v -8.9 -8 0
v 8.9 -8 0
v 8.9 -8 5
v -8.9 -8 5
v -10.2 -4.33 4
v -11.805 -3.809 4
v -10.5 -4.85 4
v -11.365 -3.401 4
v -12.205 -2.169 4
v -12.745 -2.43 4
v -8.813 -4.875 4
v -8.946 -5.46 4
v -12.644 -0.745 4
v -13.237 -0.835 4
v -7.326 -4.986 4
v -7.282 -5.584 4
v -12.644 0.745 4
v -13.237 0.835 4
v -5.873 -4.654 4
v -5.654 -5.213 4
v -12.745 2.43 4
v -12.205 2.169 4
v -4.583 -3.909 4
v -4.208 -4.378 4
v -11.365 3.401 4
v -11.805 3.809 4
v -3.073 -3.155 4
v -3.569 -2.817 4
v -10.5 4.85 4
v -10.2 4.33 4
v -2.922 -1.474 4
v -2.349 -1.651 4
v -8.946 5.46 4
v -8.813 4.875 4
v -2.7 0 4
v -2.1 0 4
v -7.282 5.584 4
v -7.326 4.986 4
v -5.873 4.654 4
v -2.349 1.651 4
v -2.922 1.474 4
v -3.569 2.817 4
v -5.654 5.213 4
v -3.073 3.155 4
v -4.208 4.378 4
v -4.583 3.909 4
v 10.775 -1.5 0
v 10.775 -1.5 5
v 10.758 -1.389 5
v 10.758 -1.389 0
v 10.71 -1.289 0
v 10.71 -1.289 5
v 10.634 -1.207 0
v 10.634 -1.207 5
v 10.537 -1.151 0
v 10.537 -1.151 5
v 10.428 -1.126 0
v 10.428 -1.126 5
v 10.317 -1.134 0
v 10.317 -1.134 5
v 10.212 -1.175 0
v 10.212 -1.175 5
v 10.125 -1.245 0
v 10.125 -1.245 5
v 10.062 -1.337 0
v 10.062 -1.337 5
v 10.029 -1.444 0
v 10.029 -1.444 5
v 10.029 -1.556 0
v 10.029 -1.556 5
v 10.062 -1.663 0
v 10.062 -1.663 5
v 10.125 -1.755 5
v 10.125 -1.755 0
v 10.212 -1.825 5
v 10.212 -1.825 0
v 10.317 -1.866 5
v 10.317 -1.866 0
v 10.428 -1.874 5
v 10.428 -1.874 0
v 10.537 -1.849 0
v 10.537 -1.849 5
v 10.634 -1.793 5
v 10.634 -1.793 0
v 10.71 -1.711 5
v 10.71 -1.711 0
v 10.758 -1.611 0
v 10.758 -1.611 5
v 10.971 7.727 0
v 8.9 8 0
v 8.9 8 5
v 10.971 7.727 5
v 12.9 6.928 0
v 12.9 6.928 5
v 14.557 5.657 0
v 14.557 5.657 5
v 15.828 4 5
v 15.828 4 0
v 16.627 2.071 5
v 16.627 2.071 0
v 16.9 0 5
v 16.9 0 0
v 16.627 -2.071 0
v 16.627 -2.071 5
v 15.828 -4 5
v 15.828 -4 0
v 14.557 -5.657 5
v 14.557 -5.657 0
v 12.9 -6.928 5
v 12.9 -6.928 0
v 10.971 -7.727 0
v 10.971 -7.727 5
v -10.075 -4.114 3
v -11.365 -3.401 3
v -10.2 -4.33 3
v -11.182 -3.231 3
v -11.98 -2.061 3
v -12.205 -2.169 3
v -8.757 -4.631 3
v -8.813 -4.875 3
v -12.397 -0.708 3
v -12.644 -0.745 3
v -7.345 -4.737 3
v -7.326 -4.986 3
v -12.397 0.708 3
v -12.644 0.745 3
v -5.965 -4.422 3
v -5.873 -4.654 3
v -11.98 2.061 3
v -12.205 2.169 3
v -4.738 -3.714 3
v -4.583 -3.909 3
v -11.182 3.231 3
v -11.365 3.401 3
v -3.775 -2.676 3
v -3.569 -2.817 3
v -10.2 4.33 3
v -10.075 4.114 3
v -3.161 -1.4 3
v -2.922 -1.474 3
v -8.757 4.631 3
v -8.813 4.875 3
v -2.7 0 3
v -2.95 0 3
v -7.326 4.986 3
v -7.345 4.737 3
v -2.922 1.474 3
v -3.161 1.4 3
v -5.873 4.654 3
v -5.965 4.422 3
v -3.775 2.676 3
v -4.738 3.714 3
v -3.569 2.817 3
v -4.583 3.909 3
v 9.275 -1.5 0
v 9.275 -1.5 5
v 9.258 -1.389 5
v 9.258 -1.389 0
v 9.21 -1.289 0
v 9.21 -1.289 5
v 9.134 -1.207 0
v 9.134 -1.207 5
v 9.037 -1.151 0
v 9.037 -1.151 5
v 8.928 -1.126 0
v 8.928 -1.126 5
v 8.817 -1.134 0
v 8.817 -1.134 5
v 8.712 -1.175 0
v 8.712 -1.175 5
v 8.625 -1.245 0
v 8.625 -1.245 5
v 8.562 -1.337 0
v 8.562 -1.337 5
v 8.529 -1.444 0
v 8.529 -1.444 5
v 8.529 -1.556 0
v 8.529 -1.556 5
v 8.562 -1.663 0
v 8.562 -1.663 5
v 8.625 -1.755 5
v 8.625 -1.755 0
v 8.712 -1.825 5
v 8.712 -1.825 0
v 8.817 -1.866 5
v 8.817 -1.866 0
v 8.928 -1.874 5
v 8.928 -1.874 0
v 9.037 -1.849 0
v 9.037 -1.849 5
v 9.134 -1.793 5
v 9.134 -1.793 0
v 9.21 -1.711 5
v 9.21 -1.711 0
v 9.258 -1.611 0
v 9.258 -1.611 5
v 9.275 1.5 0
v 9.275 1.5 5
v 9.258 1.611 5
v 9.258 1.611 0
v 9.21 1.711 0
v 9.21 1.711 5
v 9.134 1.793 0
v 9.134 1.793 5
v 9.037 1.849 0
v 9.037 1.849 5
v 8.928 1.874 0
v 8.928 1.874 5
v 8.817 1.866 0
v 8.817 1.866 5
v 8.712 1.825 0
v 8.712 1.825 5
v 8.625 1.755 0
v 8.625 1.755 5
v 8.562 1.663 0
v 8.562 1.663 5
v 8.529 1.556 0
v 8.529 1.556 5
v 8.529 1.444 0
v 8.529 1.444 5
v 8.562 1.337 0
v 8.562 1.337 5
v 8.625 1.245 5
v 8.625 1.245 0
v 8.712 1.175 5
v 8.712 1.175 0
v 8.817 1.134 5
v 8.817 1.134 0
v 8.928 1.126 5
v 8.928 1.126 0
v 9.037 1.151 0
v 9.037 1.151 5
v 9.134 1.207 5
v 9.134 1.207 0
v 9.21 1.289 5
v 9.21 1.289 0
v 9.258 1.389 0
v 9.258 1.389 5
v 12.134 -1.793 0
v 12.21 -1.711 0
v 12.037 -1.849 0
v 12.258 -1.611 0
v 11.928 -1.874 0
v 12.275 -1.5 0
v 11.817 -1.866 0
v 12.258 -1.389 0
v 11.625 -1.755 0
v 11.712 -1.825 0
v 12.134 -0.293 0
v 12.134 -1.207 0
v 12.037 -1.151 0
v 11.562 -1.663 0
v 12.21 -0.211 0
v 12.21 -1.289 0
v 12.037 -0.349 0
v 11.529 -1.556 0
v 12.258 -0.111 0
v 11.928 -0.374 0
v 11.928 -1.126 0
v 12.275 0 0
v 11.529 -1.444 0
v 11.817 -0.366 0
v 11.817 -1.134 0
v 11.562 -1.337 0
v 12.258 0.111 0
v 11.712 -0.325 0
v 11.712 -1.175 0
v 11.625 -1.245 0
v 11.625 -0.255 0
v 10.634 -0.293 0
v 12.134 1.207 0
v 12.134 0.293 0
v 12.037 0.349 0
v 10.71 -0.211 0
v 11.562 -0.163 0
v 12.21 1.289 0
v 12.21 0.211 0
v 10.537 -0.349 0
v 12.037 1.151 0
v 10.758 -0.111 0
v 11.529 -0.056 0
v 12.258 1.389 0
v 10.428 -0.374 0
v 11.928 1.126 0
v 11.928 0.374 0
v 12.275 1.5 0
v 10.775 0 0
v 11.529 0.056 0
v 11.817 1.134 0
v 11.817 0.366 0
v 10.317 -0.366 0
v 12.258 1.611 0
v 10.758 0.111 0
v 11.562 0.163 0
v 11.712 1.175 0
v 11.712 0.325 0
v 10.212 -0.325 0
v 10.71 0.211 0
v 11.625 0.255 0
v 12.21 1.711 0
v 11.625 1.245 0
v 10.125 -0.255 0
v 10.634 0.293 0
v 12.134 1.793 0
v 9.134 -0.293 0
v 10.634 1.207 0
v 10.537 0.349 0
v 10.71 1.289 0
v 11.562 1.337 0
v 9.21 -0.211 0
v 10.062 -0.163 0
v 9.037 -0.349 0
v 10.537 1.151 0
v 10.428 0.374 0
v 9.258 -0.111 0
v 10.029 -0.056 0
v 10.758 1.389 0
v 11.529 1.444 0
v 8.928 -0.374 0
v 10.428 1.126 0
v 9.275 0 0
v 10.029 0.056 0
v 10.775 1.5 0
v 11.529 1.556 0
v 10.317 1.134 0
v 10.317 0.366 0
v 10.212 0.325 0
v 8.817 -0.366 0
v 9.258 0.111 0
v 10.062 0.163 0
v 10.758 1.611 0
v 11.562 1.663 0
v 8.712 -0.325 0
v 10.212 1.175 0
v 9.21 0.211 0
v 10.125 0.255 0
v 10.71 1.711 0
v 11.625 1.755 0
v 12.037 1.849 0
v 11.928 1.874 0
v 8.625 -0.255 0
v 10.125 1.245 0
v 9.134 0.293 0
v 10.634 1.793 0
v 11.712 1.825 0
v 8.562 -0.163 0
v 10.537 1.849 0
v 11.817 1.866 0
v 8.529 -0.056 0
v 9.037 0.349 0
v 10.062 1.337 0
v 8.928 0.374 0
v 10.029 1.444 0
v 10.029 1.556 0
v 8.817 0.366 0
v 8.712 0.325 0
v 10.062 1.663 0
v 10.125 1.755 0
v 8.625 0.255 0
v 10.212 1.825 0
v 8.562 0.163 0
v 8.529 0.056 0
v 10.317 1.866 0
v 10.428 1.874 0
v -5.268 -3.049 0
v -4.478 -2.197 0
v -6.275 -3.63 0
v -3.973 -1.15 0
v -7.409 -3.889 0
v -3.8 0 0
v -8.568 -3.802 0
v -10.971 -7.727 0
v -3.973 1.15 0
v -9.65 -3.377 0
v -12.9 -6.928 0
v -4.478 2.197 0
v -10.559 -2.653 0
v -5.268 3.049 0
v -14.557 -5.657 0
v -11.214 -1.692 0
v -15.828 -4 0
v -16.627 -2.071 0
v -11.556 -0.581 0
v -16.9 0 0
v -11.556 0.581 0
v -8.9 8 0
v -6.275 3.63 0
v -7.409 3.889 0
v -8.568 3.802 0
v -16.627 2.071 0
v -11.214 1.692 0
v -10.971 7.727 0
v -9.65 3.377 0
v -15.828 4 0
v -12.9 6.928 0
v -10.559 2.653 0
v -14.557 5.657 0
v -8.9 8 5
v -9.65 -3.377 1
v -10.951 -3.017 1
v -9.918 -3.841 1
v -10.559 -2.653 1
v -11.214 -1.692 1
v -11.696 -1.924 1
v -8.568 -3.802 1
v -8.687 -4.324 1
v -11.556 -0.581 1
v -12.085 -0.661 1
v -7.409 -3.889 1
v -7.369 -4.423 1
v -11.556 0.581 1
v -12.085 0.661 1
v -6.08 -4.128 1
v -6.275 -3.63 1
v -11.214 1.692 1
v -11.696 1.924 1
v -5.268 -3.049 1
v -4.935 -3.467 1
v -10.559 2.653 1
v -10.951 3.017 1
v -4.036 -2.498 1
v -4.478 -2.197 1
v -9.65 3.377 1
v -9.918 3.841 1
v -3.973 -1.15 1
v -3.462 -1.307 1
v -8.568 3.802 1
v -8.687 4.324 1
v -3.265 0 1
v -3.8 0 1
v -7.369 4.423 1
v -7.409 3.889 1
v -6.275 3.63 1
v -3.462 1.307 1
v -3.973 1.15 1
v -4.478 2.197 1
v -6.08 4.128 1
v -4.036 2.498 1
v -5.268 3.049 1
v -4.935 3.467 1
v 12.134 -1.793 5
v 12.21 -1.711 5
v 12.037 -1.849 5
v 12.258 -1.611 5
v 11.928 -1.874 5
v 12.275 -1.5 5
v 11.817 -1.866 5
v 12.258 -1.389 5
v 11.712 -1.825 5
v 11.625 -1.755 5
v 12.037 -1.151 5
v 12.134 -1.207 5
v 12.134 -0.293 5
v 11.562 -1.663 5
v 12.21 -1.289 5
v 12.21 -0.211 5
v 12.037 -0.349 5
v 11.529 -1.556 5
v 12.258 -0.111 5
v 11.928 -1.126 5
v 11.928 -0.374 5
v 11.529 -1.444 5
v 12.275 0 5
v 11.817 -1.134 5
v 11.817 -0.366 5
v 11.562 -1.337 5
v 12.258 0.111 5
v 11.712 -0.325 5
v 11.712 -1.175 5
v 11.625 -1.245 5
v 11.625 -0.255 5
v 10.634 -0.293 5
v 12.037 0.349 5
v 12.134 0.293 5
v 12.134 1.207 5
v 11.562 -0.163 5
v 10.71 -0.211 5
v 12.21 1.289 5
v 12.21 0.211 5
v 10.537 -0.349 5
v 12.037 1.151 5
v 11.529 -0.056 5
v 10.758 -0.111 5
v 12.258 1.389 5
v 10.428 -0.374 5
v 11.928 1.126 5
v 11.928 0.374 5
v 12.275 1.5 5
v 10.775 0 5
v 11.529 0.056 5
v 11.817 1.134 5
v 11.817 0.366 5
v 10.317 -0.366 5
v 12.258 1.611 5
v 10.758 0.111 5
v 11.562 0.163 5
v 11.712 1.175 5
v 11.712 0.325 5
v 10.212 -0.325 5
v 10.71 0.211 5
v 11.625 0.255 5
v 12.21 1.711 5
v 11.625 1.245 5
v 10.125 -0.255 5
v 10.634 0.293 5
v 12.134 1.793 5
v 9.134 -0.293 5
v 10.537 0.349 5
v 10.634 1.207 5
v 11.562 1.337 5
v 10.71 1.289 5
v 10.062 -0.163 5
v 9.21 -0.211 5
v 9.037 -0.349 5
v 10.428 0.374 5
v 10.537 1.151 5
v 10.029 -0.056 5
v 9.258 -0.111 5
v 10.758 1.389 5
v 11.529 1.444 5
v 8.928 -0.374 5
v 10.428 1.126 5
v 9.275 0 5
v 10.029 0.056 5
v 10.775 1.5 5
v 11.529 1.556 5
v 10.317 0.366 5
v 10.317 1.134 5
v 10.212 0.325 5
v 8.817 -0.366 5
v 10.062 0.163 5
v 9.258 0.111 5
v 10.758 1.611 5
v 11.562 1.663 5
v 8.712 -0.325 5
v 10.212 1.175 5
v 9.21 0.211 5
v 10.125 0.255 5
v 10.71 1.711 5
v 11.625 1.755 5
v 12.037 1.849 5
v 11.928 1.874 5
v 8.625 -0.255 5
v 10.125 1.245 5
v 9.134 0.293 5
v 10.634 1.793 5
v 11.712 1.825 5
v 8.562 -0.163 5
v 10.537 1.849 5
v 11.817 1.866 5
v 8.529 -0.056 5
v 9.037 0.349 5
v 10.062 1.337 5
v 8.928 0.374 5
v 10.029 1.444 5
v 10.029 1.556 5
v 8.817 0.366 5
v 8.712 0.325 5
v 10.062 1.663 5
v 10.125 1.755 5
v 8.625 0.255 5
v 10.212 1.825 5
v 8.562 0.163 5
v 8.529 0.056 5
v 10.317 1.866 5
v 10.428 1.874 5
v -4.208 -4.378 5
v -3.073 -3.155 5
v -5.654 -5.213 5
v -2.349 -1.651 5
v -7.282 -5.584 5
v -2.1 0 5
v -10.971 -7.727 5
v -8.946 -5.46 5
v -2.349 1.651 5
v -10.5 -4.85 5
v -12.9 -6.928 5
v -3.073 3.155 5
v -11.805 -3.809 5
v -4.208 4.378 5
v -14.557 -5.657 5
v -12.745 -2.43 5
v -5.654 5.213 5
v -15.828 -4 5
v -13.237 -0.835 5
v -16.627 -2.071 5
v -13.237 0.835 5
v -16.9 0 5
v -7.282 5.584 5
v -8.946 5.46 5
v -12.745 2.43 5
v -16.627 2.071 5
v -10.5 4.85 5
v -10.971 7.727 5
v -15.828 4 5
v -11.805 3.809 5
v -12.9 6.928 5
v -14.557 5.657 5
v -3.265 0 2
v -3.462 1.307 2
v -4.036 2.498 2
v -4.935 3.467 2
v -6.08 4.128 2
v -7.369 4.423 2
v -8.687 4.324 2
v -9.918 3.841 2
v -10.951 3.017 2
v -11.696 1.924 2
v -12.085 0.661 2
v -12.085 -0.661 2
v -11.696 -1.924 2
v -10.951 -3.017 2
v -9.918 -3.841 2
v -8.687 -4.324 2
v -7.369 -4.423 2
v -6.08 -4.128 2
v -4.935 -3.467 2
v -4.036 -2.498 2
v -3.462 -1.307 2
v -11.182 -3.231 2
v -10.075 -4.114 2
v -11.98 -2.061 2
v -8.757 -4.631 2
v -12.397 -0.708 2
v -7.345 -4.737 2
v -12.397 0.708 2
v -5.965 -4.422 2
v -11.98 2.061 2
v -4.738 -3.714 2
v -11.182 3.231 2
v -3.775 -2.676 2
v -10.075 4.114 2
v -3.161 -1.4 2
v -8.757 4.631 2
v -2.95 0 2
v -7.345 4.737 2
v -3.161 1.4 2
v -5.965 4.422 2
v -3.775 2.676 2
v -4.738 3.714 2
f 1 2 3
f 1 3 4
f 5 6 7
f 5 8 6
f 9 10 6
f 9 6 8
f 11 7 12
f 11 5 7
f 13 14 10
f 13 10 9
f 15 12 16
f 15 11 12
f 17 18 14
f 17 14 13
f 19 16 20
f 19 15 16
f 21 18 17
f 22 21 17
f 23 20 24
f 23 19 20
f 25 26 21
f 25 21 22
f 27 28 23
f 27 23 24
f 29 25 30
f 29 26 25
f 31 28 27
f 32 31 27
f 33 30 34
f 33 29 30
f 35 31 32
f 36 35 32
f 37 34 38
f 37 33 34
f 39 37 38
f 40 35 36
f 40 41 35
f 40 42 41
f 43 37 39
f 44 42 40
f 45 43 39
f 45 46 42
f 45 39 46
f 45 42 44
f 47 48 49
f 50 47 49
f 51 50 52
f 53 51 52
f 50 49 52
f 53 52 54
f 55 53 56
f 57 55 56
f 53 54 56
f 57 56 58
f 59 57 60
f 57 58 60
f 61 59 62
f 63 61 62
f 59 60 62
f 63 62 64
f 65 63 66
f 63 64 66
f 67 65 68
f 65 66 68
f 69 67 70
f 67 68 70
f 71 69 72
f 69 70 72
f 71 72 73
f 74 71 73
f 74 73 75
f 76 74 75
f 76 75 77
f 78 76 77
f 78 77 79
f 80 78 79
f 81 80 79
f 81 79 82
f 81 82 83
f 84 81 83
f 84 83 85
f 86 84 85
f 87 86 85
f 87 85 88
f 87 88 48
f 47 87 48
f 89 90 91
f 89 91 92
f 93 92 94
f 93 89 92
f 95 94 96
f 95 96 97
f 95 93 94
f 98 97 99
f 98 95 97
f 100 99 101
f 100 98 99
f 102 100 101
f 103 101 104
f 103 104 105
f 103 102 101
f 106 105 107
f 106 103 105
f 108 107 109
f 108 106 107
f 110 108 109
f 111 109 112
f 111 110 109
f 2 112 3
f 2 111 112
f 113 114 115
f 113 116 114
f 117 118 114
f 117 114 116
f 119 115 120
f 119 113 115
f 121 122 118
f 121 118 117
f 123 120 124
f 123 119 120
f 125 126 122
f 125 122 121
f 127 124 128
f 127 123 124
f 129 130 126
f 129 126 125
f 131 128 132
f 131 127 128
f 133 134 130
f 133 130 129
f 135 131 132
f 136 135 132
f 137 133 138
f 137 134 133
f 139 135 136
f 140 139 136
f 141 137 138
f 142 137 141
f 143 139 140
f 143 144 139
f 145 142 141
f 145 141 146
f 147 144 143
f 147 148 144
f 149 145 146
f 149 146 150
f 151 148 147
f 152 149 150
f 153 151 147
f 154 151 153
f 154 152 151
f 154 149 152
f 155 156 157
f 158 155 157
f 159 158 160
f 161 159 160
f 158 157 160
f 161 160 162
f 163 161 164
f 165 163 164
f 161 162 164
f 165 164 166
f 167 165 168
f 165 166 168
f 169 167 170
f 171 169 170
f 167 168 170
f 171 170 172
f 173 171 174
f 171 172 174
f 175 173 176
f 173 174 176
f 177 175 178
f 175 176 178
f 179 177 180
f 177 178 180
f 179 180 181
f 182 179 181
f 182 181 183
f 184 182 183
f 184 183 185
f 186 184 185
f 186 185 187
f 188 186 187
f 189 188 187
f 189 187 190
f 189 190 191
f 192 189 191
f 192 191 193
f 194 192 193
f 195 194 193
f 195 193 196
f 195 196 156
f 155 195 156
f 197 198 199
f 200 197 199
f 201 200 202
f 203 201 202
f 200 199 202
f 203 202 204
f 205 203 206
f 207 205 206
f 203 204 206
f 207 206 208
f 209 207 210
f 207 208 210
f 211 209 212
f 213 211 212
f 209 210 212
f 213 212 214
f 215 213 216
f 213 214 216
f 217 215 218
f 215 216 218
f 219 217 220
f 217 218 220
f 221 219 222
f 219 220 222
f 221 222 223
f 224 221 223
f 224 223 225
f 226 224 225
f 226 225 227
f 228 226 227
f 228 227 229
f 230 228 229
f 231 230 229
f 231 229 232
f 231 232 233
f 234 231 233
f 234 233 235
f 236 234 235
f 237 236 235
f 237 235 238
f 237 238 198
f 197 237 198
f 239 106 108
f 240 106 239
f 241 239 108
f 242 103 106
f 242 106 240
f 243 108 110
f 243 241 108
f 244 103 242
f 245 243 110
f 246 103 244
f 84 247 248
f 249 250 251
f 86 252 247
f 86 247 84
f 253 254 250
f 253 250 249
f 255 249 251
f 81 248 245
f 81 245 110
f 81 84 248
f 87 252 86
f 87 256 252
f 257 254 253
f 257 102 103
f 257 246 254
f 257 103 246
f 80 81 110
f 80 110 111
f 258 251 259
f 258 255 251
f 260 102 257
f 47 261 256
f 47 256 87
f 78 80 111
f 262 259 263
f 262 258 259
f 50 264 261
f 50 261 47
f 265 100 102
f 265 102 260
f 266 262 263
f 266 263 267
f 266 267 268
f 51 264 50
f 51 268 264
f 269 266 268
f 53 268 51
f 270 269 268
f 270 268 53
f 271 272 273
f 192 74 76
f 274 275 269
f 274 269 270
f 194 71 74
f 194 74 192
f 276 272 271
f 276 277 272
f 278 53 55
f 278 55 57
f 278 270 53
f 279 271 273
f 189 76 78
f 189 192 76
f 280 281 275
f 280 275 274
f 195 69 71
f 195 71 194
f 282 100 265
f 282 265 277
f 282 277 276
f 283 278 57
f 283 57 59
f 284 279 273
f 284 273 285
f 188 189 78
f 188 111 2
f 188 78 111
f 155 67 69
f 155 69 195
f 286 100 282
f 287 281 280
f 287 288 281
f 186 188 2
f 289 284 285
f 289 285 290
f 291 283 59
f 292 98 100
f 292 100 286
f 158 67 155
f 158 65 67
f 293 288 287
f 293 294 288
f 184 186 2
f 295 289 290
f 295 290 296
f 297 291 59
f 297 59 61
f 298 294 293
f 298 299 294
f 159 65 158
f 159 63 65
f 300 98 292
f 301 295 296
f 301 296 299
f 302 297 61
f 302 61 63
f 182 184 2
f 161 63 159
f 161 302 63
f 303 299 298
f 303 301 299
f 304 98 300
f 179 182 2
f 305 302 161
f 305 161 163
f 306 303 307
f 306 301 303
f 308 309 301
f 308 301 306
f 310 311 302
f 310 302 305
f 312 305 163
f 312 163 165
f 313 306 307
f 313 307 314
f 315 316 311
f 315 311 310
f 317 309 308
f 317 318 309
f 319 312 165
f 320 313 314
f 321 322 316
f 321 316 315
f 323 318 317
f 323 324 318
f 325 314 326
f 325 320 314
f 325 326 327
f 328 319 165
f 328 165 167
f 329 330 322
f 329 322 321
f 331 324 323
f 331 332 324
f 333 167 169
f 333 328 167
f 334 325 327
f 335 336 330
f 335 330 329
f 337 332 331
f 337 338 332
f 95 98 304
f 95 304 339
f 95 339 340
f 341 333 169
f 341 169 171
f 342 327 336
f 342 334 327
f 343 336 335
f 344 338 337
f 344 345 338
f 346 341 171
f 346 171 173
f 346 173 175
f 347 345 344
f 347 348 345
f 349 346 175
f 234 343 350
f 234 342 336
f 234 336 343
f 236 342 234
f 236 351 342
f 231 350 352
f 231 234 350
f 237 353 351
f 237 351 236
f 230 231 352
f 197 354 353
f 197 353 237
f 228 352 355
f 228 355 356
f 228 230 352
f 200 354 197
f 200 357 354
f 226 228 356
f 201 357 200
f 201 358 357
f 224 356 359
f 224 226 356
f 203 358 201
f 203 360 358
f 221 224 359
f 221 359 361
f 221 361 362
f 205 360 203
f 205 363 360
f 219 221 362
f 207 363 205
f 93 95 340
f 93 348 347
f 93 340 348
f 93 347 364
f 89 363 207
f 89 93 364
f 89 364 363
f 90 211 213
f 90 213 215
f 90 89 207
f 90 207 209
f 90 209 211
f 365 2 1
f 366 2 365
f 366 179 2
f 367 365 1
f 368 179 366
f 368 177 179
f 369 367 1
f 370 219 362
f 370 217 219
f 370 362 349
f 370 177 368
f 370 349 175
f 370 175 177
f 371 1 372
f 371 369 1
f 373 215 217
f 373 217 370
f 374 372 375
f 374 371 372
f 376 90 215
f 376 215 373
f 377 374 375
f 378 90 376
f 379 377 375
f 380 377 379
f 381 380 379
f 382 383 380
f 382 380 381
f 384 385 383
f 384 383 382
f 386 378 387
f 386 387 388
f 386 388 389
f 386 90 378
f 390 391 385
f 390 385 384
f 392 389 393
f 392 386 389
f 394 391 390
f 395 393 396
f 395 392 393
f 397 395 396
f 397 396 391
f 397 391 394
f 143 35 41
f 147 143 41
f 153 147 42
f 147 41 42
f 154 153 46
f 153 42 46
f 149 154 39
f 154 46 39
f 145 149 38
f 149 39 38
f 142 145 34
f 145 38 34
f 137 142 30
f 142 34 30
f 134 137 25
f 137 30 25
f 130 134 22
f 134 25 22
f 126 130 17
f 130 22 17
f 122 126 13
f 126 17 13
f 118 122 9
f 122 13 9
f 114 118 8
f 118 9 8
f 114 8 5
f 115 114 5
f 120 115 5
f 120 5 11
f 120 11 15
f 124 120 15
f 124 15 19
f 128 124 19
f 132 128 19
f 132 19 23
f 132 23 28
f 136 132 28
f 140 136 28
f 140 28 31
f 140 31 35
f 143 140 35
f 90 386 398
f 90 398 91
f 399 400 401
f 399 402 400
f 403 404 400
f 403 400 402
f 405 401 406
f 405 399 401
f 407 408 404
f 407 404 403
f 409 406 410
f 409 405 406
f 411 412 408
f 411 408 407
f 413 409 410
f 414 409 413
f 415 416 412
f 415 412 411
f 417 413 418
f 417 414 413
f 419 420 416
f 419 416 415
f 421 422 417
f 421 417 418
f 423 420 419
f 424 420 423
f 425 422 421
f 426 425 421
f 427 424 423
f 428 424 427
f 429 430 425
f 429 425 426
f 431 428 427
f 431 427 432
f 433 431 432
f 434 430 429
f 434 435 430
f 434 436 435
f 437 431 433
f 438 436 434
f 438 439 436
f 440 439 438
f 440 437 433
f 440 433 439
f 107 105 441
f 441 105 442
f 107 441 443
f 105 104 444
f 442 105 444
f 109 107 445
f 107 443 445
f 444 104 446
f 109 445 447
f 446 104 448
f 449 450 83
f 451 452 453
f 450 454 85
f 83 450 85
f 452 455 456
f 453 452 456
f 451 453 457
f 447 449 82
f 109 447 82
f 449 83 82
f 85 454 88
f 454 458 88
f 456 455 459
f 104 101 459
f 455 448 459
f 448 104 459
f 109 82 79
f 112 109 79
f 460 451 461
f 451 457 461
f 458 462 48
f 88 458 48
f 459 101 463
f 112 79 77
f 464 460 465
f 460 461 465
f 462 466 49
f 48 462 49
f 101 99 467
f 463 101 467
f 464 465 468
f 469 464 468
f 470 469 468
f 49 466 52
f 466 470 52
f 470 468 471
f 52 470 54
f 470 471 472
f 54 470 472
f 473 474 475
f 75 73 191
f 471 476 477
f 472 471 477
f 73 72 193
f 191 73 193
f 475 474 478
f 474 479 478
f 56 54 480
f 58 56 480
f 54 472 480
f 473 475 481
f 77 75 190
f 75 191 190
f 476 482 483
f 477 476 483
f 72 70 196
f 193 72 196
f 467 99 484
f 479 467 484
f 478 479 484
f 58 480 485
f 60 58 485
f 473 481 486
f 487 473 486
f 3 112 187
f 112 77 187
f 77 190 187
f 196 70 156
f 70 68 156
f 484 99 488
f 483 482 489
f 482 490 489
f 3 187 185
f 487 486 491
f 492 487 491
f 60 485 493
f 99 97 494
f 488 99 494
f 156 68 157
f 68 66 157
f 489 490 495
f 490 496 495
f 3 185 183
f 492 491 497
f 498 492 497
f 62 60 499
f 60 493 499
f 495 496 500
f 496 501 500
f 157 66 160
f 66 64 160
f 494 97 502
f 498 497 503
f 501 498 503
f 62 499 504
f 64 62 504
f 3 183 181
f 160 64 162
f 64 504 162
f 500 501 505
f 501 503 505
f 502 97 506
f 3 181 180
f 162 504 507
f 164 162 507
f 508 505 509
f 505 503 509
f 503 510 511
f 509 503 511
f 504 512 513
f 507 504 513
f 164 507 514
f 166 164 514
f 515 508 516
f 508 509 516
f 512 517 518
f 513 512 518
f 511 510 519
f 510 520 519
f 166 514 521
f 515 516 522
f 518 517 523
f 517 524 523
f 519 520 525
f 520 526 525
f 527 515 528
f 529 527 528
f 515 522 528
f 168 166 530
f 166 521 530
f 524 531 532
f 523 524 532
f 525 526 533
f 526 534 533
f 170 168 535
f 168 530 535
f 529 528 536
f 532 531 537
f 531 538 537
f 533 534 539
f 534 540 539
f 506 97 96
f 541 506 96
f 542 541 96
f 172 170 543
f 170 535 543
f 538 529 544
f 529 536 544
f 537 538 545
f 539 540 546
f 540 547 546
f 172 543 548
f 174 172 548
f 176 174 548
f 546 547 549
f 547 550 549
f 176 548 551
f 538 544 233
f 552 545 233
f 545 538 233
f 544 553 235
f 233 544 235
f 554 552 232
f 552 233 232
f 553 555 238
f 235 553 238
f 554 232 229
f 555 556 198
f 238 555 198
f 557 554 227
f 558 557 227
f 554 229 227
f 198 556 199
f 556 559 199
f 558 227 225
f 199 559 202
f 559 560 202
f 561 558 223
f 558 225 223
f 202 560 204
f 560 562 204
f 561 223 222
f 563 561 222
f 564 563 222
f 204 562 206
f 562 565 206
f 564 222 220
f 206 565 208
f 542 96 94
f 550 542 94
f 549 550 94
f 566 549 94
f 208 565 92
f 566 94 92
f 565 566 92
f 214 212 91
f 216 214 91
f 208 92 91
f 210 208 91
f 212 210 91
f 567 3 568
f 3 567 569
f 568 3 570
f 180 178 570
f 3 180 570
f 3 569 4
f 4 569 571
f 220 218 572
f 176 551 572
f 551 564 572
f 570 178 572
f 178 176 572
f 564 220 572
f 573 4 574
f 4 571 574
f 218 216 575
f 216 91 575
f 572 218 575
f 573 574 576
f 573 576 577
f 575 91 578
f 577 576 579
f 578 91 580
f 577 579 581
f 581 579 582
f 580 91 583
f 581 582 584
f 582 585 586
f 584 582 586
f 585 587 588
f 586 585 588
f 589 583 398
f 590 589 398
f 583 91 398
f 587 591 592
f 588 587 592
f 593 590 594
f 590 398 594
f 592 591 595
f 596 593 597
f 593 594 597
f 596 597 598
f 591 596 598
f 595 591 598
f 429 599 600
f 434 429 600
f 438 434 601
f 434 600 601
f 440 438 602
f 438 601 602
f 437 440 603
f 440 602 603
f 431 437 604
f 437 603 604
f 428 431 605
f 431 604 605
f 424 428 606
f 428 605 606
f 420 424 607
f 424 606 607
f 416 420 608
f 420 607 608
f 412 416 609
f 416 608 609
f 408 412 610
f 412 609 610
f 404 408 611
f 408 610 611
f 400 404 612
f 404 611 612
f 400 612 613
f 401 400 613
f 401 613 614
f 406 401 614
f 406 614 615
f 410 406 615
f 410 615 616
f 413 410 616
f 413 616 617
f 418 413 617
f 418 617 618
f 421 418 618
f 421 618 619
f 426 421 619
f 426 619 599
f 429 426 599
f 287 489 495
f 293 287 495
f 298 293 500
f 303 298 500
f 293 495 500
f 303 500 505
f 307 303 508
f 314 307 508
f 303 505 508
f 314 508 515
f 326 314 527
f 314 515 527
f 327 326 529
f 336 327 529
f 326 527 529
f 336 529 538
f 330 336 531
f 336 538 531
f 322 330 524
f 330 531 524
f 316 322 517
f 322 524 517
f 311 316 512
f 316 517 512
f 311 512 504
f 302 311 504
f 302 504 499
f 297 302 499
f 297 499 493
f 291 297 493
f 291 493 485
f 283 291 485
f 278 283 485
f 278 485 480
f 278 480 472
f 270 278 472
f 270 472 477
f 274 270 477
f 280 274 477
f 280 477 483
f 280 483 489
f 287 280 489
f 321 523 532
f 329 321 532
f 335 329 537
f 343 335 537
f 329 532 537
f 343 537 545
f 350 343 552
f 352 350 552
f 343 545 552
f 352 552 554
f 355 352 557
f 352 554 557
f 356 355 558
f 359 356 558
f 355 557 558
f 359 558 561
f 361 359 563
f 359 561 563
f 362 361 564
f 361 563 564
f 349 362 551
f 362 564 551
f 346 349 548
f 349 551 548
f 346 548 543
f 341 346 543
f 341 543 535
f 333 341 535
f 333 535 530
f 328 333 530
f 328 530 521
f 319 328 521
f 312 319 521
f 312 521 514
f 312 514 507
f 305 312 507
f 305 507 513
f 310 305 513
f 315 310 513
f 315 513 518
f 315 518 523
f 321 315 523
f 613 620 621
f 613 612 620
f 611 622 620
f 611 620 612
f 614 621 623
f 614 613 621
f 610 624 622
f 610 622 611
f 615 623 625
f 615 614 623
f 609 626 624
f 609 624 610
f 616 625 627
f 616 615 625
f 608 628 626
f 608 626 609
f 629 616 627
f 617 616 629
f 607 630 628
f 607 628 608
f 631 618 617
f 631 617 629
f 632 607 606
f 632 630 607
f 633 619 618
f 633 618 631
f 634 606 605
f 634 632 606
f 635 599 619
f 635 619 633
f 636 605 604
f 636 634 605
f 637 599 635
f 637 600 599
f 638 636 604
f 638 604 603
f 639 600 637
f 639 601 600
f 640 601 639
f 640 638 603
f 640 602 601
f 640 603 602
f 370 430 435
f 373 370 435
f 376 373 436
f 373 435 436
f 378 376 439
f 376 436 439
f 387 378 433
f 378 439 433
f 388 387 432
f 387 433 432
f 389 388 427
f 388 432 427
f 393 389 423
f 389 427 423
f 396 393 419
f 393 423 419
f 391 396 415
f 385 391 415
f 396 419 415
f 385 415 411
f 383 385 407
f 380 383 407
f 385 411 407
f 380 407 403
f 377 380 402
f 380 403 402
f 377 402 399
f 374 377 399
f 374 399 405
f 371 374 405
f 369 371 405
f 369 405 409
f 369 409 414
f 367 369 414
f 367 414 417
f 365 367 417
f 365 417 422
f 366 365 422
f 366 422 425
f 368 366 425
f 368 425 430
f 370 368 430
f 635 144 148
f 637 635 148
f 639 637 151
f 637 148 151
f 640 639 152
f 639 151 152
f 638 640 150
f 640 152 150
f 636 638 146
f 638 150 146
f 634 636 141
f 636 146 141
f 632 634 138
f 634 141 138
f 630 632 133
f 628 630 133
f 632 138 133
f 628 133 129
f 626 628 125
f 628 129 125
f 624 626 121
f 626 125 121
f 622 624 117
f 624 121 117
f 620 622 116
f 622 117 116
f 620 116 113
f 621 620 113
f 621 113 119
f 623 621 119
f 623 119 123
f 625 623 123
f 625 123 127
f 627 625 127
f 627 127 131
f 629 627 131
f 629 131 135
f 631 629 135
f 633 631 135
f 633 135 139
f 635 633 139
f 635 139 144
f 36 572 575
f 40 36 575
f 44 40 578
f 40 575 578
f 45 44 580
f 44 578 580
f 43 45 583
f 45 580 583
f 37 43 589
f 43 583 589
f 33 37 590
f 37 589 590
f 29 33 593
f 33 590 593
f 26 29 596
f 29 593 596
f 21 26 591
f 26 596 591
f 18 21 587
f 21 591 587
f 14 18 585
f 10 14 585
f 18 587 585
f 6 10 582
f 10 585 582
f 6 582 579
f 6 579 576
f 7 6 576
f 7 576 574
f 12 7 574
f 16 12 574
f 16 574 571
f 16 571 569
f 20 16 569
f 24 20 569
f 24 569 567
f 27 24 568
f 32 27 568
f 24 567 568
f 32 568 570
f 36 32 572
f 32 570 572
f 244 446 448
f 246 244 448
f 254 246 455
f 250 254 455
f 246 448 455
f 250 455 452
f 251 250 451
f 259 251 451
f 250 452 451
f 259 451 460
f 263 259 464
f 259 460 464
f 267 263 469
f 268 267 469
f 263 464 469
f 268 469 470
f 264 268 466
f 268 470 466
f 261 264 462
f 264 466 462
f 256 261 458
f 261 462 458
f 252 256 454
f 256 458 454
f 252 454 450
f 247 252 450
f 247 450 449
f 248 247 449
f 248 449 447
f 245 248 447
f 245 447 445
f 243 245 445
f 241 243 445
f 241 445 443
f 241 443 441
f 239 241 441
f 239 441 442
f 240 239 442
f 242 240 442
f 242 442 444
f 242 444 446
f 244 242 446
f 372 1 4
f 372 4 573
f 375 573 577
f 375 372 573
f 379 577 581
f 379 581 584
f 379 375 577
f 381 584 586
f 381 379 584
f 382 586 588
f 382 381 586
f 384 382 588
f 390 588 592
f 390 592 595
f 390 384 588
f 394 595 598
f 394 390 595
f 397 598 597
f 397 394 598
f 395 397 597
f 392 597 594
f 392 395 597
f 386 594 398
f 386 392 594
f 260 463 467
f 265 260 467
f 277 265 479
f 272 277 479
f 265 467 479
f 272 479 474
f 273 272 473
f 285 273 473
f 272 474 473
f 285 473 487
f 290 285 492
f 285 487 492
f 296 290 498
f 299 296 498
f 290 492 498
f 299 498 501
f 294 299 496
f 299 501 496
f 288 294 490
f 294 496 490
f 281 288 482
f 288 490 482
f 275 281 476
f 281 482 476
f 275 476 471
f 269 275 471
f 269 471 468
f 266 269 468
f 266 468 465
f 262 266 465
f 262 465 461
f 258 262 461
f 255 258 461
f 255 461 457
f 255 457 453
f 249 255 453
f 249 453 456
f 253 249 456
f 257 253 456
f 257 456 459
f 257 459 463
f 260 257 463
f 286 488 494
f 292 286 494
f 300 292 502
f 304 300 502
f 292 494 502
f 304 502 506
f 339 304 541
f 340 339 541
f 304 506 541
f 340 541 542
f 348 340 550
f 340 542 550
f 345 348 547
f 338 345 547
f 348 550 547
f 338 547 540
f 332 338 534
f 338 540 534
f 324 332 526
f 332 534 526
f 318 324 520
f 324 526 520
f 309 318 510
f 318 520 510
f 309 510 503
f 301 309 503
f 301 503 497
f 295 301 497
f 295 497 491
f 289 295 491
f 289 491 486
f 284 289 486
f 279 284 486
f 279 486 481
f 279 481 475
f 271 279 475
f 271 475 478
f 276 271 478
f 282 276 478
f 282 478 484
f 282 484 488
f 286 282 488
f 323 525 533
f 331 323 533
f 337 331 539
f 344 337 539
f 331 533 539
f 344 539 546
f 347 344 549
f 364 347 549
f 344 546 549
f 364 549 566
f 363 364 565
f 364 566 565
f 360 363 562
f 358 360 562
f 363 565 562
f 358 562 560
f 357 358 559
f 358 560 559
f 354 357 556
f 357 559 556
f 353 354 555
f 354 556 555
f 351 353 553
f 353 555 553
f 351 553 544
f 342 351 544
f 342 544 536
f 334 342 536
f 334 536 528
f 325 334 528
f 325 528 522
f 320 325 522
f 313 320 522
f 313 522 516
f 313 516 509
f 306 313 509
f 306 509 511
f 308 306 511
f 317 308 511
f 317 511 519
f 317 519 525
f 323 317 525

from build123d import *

# Parameters (mm, degrees)
BOSS_EXTRUDE1_DEPTH = 5
SKETCH2_R           = 3.9
CUT_EXTRUDE1_DEPTH  = 5
SKETCH3_R           = 4.435
CUT_EXTRUDE2_DEPTH  = 4
SKETCH4_R           = 4.75
CUT_EXTRUDE3_DEPTH  = 3
SKETCH5_R           = 5
CUT_EXTRUDE4_DEPTH  = 2
SKETCH6_R           = 5.6
CUT_EXTRUDE5_DEPTH  = 1
SKETCH7_R           = 0.375
CUT_EXTRUDE6_DEPTH  = 6


with BuildPart() as part:
    # Sketch1 → Boss-Extrude1 (new body)
    with BuildSketch(Plane.XY):
        with BuildLine():
            Line((-8.9, 8), (8.9, 8))
            ThreePointArc((8.9, 8), (16.9, 0), (8.9, -8))
            Line((8.9, -8), (-8.9, -8))
            ThreePointArc((-8.9, -8), (-16.9, 0), (-8.9, 8))
        make_face()
    extrude(amount=BOSS_EXTRUDE1_DEPTH)

    # Sketch2 → Cut-Extrude1 (cut)
    with BuildSketch(Plane.XY.offset(5)):
        with Locations((-7.7, 0)):
            Circle(SKETCH2_R)
    extrude(amount=-CUT_EXTRUDE1_DEPTH, mode=Mode.SUBTRACT)

    # Sketch3 → Cut-Extrude2 (cut)
    with BuildSketch(Plane.XY.offset(5)):
        with Locations((-7.7, 0)):
            Circle(SKETCH3_R)
    extrude(amount=-CUT_EXTRUDE2_DEPTH, mode=Mode.SUBTRACT)

    # Sketch4 → Cut-Extrude3 (cut)
    with BuildSketch(Plane.XY.offset(5)):
        with Locations((-7.7, 0)):
            Circle(SKETCH4_R)
    extrude(amount=-CUT_EXTRUDE3_DEPTH, mode=Mode.SUBTRACT)

    # Sketch5 → Cut-Extrude4 (cut)
    with BuildSketch(Plane.XY.offset(5)):
        with Locations((-7.7, 0)):
            Circle(SKETCH5_R)
    extrude(amount=-CUT_EXTRUDE4_DEPTH, mode=Mode.SUBTRACT)

    # Sketch6 → Cut-Extrude5 (cut)
    with BuildSketch(Plane.XY.offset(5)):
        with Locations((-7.7, 0)):
            Circle(SKETCH6_R)
    extrude(amount=-CUT_EXTRUDE5_DEPTH, mode=Mode.SUBTRACT)

    # Sketch7 → Cut-Extrude6 (cut, through all)
    with BuildSketch(Plane.XY.offset(5)):
        with Locations((10.4, 0)):
            Circle(SKETCH7_R)
        with Locations((8.9, 0)):
            Circle(SKETCH7_R)
        with Locations((11.9, 0)):
            Circle(SKETCH7_R)
        with Locations((8.9, -1.5)):
            Circle(SKETCH7_R)
        with Locations((10.4, -1.5)):
            Circle(SKETCH7_R)
        with Locations((11.9, -1.5)):
            Circle(SKETCH7_R)
        with Locations((8.9, 1.5)):
            Circle(SKETCH7_R)
        with Locations((10.4, 1.5)):
            Circle(SKETCH7_R)
        with Locations((11.9, 1.5)):
            Circle(SKETCH7_R)
    extrude(amount=-CUT_EXTRUDE6_DEPTH, mode=Mode.SUBTRACT)


solid = part.part
